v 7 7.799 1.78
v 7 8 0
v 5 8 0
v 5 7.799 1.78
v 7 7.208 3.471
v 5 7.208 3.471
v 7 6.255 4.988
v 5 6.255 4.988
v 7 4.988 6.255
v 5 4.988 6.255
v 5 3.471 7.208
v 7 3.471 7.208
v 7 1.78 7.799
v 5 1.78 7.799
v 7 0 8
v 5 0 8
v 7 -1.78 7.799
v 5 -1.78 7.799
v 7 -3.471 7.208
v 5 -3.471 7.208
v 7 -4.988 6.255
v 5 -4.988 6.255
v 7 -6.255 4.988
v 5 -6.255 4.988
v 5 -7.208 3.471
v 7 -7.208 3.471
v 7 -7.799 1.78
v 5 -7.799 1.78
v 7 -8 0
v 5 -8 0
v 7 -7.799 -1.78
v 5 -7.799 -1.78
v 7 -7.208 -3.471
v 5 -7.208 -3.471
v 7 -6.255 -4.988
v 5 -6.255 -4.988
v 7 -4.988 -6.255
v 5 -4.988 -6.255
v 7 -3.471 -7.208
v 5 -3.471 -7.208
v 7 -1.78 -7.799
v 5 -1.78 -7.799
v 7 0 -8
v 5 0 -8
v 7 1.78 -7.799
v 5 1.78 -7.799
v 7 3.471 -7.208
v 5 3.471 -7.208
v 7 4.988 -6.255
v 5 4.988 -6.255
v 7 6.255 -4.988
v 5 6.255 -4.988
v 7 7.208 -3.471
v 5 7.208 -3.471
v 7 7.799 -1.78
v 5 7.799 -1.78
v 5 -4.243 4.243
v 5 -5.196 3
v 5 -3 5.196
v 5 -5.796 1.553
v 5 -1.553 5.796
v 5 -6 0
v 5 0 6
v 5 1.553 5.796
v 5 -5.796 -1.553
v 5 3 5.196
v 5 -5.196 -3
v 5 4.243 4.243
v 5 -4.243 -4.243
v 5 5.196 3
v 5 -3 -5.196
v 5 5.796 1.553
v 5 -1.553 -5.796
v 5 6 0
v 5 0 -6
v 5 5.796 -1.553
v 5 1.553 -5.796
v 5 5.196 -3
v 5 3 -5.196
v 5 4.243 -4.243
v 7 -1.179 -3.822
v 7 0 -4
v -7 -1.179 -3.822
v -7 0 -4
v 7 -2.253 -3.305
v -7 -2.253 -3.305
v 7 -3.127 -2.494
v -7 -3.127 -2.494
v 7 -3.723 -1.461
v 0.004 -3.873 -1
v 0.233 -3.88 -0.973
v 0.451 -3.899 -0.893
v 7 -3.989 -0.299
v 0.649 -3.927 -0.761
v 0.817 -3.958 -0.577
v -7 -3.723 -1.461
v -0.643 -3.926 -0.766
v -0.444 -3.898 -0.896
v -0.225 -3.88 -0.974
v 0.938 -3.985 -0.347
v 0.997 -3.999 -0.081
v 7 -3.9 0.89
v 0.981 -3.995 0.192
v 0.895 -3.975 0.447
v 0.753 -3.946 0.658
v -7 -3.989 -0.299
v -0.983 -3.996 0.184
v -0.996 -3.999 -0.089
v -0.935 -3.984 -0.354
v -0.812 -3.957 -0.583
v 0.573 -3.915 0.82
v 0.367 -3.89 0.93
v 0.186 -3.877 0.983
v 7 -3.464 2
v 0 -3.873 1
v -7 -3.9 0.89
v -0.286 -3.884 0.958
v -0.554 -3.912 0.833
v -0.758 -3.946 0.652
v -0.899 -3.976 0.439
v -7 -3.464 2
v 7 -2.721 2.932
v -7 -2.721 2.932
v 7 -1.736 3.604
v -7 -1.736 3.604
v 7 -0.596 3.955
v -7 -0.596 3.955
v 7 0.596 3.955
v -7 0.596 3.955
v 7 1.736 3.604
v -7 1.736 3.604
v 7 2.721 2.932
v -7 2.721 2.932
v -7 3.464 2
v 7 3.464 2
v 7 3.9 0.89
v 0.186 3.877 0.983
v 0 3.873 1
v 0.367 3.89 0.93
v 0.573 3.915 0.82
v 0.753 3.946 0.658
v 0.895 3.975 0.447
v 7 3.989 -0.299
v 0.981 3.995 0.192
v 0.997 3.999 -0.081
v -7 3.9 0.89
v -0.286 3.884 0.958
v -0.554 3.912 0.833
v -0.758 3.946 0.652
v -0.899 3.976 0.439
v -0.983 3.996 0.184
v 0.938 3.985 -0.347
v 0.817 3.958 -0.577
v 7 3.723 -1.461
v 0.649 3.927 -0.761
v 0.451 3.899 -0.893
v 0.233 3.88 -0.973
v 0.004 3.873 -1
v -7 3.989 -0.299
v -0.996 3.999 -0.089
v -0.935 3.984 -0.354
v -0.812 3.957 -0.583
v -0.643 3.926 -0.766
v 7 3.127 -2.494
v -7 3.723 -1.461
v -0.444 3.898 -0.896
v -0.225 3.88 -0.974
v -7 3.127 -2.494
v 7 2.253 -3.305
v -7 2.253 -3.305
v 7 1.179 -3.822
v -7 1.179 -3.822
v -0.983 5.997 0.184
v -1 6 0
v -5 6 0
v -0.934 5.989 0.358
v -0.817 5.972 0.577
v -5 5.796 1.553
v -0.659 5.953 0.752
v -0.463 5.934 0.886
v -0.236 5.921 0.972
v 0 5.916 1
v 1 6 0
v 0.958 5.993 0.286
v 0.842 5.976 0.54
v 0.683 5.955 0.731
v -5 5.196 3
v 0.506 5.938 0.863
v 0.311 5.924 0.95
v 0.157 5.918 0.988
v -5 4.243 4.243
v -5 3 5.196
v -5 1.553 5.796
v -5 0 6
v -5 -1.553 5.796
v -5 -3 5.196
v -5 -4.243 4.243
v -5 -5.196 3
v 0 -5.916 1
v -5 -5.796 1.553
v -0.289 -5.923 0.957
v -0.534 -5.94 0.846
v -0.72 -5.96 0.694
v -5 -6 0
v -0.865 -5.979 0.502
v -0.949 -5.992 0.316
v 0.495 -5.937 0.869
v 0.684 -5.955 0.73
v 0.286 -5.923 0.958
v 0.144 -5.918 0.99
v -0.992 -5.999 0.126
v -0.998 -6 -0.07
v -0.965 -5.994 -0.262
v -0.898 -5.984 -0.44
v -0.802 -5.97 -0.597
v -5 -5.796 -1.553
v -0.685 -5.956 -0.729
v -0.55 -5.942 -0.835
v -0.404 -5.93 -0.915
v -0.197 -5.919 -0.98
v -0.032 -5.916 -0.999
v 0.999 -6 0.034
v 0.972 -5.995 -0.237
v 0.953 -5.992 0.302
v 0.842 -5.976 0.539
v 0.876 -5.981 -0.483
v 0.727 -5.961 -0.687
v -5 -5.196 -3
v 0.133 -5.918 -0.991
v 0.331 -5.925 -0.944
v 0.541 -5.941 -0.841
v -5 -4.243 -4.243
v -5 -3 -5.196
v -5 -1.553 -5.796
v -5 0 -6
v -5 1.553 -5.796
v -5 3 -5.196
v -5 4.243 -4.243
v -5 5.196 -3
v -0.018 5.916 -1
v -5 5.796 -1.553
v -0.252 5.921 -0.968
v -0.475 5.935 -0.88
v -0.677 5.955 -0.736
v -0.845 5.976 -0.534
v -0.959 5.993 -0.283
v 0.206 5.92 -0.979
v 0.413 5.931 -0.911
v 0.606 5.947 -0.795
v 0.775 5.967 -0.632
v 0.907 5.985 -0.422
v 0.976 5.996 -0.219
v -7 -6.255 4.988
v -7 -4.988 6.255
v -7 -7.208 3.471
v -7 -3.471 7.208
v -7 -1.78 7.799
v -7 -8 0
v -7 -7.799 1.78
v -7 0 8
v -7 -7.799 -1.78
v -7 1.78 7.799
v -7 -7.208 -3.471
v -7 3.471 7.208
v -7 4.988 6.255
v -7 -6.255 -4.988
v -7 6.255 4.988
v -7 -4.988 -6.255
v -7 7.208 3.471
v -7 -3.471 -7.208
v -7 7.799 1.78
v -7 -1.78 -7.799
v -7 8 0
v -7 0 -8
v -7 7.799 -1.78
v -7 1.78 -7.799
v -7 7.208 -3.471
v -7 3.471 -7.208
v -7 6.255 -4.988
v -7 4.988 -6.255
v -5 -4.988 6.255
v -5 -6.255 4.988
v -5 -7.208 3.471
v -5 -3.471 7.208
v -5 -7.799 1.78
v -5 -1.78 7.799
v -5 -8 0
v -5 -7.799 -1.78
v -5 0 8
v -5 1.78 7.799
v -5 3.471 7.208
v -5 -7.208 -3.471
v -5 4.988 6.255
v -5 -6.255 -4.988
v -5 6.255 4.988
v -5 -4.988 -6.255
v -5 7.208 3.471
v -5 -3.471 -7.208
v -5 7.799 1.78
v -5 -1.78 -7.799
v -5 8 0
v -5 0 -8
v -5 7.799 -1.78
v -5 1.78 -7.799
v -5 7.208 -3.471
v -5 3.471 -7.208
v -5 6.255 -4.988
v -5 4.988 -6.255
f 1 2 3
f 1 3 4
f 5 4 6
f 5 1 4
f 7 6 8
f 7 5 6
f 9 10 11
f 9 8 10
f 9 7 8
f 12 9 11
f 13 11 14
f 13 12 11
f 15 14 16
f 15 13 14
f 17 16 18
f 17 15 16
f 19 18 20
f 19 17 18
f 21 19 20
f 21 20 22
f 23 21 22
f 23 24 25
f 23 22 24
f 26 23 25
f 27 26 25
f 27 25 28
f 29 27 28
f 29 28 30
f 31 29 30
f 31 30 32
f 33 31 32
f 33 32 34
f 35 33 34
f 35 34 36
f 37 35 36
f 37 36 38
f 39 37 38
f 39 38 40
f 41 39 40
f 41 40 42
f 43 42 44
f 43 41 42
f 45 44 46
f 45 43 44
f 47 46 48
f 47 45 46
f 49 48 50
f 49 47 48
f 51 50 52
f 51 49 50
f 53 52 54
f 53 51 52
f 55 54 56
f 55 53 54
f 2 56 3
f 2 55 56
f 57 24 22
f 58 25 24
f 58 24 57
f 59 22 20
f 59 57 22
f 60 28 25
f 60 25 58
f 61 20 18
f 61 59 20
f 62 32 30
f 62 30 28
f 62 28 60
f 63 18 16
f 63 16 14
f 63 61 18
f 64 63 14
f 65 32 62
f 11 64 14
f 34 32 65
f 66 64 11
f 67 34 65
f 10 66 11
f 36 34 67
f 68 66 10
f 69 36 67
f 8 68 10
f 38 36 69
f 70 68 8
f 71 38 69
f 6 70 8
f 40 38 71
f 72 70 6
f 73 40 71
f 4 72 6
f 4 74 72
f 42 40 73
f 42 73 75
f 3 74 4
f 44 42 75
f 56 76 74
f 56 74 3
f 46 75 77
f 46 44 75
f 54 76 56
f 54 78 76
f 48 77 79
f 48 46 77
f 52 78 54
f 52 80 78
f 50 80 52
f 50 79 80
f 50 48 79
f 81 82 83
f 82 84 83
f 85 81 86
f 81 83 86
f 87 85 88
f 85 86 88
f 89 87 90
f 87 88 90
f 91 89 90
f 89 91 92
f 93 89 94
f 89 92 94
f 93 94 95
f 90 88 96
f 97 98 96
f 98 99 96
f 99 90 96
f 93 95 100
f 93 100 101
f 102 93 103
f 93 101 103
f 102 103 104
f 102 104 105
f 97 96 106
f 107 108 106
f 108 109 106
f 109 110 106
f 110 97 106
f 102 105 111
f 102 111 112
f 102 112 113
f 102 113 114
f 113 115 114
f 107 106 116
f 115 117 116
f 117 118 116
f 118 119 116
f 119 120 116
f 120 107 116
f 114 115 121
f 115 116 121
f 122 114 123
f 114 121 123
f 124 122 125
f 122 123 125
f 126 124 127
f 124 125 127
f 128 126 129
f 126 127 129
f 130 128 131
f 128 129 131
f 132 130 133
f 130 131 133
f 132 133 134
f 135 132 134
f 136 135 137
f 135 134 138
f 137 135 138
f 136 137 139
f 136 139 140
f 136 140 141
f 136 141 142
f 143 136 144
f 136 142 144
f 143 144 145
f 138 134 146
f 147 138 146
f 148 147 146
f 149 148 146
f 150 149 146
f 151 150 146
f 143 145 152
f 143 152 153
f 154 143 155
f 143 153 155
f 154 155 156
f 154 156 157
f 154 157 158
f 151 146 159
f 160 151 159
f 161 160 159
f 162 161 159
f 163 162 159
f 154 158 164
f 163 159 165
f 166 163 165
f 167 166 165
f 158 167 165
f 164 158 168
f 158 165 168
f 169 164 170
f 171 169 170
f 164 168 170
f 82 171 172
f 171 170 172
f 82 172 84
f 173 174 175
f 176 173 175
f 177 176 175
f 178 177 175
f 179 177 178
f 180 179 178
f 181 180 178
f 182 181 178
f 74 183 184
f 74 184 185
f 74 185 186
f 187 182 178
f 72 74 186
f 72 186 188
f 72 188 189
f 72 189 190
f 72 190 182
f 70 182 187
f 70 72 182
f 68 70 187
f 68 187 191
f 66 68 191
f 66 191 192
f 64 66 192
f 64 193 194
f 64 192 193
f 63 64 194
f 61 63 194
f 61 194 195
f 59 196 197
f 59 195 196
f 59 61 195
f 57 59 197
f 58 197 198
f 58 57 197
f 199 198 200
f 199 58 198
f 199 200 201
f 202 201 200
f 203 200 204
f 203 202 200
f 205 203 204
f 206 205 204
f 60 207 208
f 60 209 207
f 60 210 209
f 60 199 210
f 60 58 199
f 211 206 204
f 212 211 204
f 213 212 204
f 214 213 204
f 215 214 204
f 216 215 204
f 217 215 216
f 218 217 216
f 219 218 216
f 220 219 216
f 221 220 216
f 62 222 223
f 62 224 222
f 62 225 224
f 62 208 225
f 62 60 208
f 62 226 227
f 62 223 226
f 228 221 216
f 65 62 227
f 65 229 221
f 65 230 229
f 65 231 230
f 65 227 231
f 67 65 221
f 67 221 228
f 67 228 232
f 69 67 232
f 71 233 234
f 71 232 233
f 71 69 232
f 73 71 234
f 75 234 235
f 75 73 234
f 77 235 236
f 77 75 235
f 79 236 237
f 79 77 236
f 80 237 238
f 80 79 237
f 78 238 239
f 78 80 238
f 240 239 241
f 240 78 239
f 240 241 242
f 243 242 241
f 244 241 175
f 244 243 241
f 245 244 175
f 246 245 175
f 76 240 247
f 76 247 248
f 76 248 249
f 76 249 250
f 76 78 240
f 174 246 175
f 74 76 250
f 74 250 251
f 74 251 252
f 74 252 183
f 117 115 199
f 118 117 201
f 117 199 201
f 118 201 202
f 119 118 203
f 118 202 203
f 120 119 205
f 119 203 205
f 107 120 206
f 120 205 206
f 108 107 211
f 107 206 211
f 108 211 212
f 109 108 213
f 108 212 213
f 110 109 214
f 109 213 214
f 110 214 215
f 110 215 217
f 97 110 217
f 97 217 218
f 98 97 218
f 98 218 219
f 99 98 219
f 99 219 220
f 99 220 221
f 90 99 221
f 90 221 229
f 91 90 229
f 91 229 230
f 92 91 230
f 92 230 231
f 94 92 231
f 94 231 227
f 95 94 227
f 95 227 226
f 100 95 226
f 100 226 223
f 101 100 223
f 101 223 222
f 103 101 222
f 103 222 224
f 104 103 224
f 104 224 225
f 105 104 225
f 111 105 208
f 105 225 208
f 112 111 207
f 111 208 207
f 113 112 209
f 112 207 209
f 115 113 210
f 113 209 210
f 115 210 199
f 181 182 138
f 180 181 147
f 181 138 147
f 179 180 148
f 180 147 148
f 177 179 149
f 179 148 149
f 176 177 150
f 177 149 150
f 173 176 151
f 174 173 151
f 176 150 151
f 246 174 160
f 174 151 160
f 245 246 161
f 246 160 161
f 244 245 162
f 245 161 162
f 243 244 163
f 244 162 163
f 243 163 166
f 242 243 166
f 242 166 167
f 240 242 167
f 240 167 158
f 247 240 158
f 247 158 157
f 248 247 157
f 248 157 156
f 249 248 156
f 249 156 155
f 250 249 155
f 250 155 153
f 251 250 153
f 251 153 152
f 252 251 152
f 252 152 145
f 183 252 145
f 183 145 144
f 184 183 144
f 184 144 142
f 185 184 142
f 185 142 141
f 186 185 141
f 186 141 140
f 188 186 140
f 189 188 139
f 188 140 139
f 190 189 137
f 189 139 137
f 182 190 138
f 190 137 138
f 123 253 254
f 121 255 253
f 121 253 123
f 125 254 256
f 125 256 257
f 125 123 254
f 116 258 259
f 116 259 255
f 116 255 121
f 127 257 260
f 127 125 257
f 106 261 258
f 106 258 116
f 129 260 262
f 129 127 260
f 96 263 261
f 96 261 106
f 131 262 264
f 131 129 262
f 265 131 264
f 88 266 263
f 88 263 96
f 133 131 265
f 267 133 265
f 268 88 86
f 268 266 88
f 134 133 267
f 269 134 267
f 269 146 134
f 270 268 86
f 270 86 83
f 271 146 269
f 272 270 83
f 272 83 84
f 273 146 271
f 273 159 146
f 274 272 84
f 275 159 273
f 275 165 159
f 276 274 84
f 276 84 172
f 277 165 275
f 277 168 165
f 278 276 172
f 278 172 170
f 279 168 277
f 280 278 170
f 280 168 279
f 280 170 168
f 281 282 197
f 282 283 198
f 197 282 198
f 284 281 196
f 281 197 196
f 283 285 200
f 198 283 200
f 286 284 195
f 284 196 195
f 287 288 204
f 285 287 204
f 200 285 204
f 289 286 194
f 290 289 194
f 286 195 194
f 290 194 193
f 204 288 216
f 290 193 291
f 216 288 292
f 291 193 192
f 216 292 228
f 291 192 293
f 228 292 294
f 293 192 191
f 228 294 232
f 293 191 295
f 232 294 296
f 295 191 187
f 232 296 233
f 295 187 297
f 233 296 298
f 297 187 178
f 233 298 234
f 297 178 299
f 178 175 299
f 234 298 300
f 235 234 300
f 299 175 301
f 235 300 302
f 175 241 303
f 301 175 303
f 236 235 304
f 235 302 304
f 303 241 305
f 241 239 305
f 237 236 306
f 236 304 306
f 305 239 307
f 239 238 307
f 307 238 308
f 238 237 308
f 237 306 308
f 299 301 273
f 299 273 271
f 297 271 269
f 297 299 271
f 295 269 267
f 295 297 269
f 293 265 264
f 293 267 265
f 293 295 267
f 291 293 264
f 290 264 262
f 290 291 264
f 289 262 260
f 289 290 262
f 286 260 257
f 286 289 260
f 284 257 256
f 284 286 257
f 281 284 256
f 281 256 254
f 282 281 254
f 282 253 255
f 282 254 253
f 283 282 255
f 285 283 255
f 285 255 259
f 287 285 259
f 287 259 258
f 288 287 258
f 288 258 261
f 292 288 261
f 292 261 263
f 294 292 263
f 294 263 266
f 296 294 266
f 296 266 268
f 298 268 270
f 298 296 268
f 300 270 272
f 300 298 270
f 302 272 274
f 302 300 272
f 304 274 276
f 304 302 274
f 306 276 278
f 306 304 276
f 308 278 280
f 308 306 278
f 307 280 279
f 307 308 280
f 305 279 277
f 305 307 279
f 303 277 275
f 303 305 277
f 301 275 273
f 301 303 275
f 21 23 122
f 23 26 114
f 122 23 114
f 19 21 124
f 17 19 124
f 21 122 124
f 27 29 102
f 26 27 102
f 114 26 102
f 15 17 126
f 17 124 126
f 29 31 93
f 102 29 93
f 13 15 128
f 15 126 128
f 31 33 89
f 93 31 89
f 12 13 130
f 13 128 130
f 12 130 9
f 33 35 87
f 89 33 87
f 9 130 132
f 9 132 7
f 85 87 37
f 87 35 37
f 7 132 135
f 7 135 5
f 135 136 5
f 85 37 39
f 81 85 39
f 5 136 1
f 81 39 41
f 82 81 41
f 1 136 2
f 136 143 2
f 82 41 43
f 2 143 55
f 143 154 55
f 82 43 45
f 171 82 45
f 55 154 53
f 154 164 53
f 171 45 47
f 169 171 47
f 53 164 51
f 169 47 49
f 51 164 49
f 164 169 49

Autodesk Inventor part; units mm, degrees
ref_plane "YZ Plane" through (0, 0, 0) normal (1, 0, 0) x (0, 1, 0)
ref_plane "XY Plane" through (0, 0, 0) normal (0, 0, 1) x (1, 0, 0)
sketch "Sketch1" plane through (0, 0, 0) normal (0, 0, 1) x (1, 0, 0)
  line L0 (-7, 0) -> (-7, 8)
  line L1 (-7, 8) -> (-5, 8)
  line L2 (-5, 8) -> (-5, 6)
  line L3 (-5, 6) -> (5, 6)
  line L4 (5, 6) -> (5, 8)
  line L5 (5, 8) -> (7, 8)
  line L6 (7, 8) -> (7, 0)
  line L7 (7, 0) -> (-7, 0)
  point P0 (0, 0)
  point P1 (0, 0)
  dimension "d0" = 10
  dimension "d1" = 16
  dimension "d2" = 12
  dimension "d3" = 2
  dimension "d4" = 2
  dimension "d5" = 5
revolve "Revolution1" add sketch "Sketch1" angle 360 about axis through (7, 0, 0) along (-1, 0, 0)
ref_plane "Work Plane1" through (0, 6, 0) normal (0, 1, 0) x (-1, 0, 0)
sketch "Sketch3" plane through (0, 6, 0) normal (0, 1, 0) x (-1, 0, 0)
  point P0 (0, 0)
  point P1 (0, 0)
sketch "Sketch2" plane through (7, 0, 0) normal (1, 0, 0) x (0, 0, -1)
  circle A0 centre (0, 0) radius 8 projected
  point P0 (0, 0)
hole "Hole1" at (7, 0, 0) direction (-1, 0, 0) diameter 8 depth 14
hole "Hole2" at (0, 6, 0) direction (0, -1, 0) diameter 2 end through all
equation "\"d4\" = d3"
properties part number "146" material "Rubber"
